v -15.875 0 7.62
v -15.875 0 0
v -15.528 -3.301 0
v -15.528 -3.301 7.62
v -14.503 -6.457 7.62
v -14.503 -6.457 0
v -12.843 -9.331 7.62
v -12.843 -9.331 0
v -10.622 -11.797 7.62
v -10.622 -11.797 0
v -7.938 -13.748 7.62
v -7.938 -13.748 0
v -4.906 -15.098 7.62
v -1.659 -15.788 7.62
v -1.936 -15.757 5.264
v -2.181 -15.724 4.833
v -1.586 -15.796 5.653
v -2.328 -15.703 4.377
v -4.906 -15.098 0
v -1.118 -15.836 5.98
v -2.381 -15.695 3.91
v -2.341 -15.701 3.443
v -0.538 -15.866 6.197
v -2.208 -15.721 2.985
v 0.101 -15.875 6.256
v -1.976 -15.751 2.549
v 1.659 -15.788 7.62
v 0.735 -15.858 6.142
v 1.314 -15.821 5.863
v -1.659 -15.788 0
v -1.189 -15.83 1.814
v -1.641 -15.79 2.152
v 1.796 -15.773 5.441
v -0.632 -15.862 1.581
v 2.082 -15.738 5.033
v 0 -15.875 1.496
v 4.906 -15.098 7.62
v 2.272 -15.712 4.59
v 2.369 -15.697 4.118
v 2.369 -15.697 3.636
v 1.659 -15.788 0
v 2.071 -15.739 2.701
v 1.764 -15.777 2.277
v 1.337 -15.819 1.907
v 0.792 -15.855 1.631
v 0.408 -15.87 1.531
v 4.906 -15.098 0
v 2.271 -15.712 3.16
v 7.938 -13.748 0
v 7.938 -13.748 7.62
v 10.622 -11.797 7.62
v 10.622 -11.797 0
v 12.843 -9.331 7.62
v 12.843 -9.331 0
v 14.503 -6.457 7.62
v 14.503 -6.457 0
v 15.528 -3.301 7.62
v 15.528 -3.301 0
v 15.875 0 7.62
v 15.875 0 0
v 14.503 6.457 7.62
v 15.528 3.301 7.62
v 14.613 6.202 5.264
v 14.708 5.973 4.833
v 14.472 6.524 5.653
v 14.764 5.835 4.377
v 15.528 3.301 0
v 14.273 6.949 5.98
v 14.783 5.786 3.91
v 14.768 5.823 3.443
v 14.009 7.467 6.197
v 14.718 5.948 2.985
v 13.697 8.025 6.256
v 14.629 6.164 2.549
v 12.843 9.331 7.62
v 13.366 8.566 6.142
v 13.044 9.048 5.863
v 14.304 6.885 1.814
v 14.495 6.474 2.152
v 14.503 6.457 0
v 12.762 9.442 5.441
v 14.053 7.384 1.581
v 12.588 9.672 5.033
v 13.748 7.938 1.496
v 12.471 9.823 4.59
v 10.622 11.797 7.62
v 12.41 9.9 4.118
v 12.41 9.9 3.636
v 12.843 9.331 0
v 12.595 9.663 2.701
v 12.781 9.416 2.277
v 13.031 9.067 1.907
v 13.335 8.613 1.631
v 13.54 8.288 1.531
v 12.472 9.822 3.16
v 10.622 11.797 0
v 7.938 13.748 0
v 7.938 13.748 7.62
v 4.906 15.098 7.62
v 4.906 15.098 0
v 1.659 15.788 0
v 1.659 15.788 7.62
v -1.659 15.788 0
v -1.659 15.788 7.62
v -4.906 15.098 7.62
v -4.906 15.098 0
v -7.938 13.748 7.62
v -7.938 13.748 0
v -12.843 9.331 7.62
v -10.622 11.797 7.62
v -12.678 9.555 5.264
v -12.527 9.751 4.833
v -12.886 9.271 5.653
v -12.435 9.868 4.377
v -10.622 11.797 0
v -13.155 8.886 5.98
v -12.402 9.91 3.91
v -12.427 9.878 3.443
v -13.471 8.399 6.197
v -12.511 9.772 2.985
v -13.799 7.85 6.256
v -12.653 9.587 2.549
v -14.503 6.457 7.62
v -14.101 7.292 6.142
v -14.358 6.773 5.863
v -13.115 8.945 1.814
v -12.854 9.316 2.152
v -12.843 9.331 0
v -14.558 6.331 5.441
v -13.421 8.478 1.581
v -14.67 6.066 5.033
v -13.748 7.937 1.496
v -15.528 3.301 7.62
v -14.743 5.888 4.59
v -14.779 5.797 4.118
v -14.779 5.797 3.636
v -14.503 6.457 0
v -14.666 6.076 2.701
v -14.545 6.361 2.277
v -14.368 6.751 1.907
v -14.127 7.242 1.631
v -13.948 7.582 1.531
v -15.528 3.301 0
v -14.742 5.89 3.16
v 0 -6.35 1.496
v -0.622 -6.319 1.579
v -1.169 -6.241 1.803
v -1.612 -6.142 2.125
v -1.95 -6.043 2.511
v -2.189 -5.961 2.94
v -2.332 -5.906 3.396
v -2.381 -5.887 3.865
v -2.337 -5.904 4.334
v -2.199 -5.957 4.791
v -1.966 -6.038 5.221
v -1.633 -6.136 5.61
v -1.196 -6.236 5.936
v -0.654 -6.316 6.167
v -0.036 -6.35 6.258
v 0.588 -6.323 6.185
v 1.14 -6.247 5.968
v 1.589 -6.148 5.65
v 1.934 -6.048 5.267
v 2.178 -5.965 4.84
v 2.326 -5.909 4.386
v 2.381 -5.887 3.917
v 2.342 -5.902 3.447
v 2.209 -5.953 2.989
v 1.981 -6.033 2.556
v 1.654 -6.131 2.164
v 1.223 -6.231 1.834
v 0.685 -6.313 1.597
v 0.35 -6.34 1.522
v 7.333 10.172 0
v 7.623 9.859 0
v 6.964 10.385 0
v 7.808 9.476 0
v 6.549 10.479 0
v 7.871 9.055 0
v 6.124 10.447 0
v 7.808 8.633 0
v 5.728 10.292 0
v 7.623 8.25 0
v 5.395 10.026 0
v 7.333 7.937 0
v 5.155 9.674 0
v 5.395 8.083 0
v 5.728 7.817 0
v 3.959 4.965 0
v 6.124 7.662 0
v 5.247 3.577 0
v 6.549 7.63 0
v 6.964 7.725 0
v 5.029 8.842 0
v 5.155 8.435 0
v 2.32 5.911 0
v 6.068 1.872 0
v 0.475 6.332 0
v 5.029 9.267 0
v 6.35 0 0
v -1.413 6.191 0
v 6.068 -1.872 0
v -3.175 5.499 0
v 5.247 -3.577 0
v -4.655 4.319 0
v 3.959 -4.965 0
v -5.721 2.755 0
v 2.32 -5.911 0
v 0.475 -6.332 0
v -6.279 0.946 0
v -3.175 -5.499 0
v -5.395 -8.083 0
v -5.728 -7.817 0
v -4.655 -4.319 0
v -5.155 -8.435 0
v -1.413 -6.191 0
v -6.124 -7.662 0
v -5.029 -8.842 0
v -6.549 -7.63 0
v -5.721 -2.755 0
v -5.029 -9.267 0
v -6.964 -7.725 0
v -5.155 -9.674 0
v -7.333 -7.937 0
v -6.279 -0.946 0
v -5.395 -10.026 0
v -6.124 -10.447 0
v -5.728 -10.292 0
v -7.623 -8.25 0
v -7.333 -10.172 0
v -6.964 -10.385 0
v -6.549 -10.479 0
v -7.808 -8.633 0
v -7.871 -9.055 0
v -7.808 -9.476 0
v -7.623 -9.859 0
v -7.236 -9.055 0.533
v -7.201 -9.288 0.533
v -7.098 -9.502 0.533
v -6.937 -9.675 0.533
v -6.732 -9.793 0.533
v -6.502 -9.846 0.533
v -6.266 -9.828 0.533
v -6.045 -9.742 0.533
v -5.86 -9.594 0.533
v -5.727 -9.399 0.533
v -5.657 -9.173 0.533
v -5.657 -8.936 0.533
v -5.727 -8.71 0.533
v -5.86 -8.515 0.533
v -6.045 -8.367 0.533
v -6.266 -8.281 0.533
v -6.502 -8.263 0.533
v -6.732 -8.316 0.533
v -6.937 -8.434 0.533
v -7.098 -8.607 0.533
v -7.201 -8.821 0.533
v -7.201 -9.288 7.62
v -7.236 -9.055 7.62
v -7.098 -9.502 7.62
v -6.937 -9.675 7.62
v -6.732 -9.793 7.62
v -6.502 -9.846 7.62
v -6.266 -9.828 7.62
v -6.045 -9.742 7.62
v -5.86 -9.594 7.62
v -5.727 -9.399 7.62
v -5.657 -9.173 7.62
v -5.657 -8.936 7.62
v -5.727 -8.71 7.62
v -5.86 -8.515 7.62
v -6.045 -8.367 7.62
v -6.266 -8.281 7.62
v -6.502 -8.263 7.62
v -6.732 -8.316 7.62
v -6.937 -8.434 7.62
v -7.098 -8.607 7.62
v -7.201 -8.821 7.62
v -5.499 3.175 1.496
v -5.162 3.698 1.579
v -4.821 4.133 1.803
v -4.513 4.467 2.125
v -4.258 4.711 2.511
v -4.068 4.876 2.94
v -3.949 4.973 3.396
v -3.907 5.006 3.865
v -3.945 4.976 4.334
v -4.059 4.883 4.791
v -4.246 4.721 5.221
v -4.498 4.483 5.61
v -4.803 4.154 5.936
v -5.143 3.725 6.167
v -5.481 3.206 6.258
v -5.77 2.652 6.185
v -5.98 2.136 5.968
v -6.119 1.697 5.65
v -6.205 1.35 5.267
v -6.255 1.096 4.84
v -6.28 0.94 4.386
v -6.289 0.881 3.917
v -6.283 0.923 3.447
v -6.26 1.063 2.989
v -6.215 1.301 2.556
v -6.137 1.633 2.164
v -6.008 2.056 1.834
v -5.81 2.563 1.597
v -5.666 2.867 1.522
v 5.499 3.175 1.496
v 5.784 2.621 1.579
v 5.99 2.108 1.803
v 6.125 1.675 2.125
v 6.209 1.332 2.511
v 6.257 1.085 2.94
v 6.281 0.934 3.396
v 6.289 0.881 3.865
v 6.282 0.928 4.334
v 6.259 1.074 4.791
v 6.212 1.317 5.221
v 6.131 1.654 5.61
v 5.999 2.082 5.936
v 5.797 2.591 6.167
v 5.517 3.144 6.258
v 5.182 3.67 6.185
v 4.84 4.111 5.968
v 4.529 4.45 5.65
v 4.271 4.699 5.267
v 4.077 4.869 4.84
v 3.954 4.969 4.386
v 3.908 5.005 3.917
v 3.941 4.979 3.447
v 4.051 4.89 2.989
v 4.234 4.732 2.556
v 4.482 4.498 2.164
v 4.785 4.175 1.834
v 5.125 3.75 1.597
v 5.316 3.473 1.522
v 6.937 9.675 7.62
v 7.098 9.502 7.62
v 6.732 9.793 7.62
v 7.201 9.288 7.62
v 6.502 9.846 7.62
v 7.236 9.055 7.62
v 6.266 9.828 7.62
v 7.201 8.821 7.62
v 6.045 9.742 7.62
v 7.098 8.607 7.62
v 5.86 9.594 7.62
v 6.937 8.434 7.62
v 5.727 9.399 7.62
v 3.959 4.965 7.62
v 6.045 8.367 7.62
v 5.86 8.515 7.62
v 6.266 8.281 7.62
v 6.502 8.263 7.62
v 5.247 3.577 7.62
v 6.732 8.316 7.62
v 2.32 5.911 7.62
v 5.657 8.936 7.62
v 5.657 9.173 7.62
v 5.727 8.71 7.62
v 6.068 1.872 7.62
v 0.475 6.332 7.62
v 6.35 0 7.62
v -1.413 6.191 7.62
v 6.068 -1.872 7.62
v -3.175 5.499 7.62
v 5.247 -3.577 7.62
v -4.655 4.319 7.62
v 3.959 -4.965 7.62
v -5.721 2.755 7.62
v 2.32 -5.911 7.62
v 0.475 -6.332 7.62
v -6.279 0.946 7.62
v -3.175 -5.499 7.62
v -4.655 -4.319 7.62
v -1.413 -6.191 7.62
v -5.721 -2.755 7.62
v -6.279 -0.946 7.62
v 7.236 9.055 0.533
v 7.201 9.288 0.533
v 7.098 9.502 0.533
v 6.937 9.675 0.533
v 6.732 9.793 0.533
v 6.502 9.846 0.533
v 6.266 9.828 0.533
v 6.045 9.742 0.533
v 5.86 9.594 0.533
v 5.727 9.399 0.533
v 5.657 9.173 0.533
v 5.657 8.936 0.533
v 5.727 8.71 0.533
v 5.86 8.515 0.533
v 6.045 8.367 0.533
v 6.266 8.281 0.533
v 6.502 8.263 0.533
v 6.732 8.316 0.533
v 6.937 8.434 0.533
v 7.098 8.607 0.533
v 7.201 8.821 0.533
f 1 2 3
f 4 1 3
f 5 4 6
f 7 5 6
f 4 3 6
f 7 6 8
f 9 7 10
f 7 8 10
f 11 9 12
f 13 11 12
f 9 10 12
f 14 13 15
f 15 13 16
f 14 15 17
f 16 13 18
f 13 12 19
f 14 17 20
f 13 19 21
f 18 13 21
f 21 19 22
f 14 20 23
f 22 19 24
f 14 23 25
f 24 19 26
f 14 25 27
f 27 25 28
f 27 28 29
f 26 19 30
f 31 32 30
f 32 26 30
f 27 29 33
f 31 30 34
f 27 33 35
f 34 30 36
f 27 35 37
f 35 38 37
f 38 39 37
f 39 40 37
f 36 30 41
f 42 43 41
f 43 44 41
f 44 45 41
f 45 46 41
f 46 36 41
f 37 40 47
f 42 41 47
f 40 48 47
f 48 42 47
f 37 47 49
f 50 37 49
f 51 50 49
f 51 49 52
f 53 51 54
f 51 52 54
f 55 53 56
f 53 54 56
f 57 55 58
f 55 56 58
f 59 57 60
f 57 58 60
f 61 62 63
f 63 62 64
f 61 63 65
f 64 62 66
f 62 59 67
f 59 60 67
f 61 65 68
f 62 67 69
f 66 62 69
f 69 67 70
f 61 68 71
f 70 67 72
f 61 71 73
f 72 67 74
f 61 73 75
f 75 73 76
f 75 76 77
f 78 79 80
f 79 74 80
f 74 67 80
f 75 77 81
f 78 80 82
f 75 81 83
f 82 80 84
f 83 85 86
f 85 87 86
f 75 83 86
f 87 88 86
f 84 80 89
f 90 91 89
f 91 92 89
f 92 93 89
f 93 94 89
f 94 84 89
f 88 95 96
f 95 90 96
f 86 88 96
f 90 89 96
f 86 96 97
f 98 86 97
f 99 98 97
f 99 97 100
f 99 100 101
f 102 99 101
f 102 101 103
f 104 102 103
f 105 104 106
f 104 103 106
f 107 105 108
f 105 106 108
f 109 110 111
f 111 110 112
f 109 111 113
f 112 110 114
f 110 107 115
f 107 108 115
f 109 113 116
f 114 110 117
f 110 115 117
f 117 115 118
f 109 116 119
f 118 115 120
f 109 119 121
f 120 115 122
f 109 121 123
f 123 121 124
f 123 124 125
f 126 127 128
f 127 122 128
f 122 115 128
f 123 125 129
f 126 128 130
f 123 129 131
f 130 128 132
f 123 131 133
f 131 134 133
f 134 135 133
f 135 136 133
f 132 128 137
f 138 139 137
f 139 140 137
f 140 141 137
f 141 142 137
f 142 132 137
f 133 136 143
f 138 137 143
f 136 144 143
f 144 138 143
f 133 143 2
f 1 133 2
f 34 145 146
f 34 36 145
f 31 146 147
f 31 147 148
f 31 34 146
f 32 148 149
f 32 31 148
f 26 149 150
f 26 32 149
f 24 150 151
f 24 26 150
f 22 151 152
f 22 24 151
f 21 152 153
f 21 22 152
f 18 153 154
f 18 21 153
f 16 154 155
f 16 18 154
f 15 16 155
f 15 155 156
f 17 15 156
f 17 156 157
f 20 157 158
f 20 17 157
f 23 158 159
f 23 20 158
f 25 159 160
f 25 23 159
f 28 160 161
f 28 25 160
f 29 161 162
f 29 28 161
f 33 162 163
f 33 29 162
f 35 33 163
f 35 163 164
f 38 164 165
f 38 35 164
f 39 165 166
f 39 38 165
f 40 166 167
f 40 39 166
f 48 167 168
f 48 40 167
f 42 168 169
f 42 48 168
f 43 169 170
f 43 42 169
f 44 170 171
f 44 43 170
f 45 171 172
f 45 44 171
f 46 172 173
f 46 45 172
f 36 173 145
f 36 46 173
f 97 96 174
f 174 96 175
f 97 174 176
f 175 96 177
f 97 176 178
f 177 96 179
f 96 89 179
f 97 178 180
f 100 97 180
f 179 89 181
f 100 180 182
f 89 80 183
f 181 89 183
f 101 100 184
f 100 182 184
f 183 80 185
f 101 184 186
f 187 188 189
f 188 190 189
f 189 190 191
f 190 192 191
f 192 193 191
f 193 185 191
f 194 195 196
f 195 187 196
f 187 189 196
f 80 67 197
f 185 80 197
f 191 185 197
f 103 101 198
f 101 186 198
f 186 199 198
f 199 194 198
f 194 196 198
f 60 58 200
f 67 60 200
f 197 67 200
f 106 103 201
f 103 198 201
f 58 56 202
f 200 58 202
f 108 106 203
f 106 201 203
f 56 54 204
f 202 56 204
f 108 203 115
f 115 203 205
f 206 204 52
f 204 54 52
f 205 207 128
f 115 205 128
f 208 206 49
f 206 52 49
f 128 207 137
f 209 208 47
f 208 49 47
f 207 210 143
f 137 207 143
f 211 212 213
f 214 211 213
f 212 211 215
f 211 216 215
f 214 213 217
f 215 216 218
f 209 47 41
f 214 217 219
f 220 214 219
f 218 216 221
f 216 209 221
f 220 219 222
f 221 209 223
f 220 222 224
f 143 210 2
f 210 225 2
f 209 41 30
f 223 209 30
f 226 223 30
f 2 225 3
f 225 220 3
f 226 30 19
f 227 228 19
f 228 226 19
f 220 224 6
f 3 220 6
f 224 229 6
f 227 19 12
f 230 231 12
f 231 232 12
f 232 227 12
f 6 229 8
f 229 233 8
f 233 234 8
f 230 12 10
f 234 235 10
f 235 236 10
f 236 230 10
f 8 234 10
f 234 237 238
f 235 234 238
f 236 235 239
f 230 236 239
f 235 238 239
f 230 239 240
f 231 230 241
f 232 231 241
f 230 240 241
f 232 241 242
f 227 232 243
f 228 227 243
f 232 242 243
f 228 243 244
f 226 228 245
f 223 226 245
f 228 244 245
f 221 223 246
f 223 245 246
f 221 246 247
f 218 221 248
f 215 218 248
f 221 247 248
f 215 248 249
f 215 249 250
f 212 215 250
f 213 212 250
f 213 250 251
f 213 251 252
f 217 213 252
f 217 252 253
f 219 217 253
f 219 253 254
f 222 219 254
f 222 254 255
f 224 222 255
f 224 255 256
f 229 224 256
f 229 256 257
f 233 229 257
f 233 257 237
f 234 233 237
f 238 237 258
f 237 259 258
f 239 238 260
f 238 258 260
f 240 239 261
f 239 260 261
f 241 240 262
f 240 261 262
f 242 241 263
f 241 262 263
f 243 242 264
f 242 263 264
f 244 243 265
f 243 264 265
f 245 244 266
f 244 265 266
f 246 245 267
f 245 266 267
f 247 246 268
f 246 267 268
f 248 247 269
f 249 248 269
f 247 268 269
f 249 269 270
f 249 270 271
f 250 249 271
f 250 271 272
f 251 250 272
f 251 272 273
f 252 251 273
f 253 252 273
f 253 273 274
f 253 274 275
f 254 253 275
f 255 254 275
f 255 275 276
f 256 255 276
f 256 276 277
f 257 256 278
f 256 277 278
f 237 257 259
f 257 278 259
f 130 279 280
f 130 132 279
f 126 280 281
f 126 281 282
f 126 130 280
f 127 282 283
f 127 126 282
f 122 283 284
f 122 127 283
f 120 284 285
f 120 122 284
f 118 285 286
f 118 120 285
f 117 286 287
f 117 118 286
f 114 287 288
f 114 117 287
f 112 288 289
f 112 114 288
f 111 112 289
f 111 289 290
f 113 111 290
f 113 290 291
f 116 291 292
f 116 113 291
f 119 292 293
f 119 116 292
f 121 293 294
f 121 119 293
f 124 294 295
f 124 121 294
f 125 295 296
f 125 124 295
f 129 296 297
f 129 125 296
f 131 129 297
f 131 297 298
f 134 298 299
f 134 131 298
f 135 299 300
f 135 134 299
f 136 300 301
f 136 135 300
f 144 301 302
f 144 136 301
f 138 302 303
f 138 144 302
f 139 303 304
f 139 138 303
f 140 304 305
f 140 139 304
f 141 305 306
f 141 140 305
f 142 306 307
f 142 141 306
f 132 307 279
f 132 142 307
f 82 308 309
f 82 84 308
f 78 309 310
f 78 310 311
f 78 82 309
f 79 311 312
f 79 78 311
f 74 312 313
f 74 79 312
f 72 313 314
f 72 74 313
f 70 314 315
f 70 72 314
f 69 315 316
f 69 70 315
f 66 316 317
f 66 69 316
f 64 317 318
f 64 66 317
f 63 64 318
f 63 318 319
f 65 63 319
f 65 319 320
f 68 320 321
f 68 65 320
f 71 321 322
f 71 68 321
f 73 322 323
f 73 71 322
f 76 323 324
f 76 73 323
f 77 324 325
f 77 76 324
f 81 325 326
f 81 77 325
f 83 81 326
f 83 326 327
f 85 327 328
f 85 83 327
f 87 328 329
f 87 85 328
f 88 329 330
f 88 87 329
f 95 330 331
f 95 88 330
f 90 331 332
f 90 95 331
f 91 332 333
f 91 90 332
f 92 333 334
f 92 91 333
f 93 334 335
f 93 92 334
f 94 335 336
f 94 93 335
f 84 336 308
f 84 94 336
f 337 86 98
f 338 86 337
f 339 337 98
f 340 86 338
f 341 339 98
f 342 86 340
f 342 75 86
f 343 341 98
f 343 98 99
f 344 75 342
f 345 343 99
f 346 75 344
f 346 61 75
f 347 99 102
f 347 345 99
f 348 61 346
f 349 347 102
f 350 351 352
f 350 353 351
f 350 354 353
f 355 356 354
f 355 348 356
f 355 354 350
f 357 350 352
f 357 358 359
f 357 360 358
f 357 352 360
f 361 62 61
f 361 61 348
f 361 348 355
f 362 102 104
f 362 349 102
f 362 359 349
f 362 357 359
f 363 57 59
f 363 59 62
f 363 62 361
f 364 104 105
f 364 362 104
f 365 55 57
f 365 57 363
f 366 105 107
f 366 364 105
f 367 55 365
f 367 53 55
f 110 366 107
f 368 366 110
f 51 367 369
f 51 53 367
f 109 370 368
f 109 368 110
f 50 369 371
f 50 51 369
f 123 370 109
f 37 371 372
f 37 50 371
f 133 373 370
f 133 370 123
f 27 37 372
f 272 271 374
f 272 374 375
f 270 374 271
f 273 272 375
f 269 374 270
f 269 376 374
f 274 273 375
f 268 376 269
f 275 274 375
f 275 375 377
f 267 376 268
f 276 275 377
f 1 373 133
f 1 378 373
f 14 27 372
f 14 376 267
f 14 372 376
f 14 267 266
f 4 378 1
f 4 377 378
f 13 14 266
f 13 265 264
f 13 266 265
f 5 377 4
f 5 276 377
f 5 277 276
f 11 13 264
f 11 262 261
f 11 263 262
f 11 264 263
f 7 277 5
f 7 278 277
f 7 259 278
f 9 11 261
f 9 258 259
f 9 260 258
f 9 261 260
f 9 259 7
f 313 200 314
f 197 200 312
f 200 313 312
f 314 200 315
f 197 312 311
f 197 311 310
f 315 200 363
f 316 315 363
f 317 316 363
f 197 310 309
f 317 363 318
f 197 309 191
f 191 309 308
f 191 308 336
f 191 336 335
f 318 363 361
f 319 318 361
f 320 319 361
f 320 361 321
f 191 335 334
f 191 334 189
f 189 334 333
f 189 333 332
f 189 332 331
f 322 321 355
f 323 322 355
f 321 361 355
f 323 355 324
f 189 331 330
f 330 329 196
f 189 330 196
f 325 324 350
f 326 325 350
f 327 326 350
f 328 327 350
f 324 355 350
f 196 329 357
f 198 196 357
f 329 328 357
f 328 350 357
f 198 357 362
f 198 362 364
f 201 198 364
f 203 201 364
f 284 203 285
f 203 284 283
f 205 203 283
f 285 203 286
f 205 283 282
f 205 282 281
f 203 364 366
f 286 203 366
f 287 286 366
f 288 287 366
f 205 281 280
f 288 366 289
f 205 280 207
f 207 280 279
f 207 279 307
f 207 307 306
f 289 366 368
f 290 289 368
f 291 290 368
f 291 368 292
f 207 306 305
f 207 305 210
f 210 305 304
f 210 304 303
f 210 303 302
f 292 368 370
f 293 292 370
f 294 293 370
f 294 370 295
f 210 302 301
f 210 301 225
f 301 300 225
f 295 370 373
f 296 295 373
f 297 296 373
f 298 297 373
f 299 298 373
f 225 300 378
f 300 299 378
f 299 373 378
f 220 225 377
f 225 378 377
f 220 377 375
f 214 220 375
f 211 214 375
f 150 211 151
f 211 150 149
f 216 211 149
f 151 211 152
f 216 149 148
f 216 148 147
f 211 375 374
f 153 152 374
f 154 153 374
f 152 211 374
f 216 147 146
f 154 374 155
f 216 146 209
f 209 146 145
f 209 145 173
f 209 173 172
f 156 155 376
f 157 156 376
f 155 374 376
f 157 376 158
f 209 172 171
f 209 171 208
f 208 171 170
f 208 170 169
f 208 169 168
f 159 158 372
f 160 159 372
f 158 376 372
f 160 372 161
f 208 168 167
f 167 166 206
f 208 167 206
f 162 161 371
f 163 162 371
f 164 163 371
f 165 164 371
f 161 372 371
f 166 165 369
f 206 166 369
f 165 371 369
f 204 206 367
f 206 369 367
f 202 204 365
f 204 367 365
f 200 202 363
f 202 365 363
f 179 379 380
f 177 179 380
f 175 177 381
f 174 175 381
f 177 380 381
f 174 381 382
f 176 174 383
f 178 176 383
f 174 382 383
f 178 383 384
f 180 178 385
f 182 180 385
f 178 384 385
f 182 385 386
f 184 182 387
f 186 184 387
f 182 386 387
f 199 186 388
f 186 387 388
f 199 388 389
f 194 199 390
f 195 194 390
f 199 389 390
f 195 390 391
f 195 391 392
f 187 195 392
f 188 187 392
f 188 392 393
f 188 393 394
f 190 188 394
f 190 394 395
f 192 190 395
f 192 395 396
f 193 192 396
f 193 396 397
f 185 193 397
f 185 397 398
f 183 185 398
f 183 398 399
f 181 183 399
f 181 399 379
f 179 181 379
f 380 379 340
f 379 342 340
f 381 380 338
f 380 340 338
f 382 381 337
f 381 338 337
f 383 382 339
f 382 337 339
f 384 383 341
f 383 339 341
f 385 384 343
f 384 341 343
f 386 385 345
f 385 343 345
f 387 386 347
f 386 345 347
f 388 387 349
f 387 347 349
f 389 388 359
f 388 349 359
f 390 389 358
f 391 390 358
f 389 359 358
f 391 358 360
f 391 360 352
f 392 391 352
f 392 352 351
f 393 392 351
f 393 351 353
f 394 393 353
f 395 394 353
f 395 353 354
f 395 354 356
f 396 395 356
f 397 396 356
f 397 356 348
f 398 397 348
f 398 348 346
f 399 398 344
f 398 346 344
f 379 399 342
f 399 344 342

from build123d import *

# Parameters (mm, degrees)
SKETCH1_R                                = 15.875
BOSS_EXTRUDE1_DEPTH                      = 7.62
SKETCH2_R                                = 6.35
CUT_EXTRUDE1_DEPTH                       = 24.708556472
CIRPATTERN1_COUNT                        = 3
F_1_16_0_0625_DIAMETER_HOLE1_D           = 1.5875
F_1_16_0_0625_DIAMETER_HOLE1_CSINK_D     = 2.8575
F_1_16_0_0625_DIAMETER_HOLE1_CSINK_ANGLE = 100
CIRPATTERN2_COUNT                        = 2


with BuildPart() as part:
    # Sketch1 → Boss-Extrude1 (new body)
    with BuildSketch(Plane.XY):
        with Locations(Location((0, 0, 0), (0, 0, 180))):
            Circle(SKETCH1_R)
    extrude(amount=BOSS_EXTRUDE1_DEPTH)

    # Sketch2 → Cut-Extrude1 (cut, through all)
    with BuildSketch(Plane.XY.offset(7.62)):
        Circle(SKETCH2_R)
    extrude(amount=-CUT_EXTRUDE1_DEPTH, mode=Mode.SUBTRACT)

    # Sketch36 → 3/16 (0.1875) Diameter Hole1 (revolve, cut)
    with BuildSketch(Plane(origin=(0, -15.875, 3.877224023), x_dir=(0, 0, -1), z_dir=(1, 0, 0))):
        Polygon((0, 0), (0, 20.480799349), (2.38125, 19.05), (2.38125, 0), align=None)
    f_3_16_0_1875_diameter_hole1 = revolve(axis=Axis((0, -22.225, 3.877224023), (0, 1, 0)), mode=Mode.SUBTRACT)

    # CirPattern1: 3/16 (0.1875) Diameter Hole1 ×3 about axis
    cirpattern1_axis = Axis((0, 0, 7.62), (0, 0, -1))
    for i in range(1, CIRPATTERN1_COUNT):
        add(f_3_16_0_1875_diameter_hole1.rotate(cirpattern1_axis, i * 360 / CIRPATTERN1_COUNT), mode=Mode.SUBTRACT)

    # 1/16 (0.0625) Diameter Hole1 (through all)
    with Locations(Plane(origin=(0, 0, 0), x_dir=(-1, 0, 0), z_dir=(0, 0, -1))):
        with Locations((-6.442291542, 9.054531238)):
            f_1_16_0_0625_diameter_hole1 = CounterSinkHole(F_1_16_0_0625_DIAMETER_HOLE1_D / 2, F_1_16_0_0625_DIAMETER_HOLE1_CSINK_D / 2, counter_sink_angle=F_1_16_0_0625_DIAMETER_HOLE1_CSINK_ANGLE)

    # CirPattern2: 1/16 (0.0625) Diameter Hole1 ×2 about axis
    cirpattern2_axis = Axis((0, 0, 0), (0, 0, 1))
    for i in range(1, CIRPATTERN2_COUNT):
        add(f_1_16_0_0625_diameter_hole1.rotate(cirpattern2_axis, i * 360 / CIRPATTERN2_COUNT), mode=Mode.SUBTRACT)


solid = part.part
